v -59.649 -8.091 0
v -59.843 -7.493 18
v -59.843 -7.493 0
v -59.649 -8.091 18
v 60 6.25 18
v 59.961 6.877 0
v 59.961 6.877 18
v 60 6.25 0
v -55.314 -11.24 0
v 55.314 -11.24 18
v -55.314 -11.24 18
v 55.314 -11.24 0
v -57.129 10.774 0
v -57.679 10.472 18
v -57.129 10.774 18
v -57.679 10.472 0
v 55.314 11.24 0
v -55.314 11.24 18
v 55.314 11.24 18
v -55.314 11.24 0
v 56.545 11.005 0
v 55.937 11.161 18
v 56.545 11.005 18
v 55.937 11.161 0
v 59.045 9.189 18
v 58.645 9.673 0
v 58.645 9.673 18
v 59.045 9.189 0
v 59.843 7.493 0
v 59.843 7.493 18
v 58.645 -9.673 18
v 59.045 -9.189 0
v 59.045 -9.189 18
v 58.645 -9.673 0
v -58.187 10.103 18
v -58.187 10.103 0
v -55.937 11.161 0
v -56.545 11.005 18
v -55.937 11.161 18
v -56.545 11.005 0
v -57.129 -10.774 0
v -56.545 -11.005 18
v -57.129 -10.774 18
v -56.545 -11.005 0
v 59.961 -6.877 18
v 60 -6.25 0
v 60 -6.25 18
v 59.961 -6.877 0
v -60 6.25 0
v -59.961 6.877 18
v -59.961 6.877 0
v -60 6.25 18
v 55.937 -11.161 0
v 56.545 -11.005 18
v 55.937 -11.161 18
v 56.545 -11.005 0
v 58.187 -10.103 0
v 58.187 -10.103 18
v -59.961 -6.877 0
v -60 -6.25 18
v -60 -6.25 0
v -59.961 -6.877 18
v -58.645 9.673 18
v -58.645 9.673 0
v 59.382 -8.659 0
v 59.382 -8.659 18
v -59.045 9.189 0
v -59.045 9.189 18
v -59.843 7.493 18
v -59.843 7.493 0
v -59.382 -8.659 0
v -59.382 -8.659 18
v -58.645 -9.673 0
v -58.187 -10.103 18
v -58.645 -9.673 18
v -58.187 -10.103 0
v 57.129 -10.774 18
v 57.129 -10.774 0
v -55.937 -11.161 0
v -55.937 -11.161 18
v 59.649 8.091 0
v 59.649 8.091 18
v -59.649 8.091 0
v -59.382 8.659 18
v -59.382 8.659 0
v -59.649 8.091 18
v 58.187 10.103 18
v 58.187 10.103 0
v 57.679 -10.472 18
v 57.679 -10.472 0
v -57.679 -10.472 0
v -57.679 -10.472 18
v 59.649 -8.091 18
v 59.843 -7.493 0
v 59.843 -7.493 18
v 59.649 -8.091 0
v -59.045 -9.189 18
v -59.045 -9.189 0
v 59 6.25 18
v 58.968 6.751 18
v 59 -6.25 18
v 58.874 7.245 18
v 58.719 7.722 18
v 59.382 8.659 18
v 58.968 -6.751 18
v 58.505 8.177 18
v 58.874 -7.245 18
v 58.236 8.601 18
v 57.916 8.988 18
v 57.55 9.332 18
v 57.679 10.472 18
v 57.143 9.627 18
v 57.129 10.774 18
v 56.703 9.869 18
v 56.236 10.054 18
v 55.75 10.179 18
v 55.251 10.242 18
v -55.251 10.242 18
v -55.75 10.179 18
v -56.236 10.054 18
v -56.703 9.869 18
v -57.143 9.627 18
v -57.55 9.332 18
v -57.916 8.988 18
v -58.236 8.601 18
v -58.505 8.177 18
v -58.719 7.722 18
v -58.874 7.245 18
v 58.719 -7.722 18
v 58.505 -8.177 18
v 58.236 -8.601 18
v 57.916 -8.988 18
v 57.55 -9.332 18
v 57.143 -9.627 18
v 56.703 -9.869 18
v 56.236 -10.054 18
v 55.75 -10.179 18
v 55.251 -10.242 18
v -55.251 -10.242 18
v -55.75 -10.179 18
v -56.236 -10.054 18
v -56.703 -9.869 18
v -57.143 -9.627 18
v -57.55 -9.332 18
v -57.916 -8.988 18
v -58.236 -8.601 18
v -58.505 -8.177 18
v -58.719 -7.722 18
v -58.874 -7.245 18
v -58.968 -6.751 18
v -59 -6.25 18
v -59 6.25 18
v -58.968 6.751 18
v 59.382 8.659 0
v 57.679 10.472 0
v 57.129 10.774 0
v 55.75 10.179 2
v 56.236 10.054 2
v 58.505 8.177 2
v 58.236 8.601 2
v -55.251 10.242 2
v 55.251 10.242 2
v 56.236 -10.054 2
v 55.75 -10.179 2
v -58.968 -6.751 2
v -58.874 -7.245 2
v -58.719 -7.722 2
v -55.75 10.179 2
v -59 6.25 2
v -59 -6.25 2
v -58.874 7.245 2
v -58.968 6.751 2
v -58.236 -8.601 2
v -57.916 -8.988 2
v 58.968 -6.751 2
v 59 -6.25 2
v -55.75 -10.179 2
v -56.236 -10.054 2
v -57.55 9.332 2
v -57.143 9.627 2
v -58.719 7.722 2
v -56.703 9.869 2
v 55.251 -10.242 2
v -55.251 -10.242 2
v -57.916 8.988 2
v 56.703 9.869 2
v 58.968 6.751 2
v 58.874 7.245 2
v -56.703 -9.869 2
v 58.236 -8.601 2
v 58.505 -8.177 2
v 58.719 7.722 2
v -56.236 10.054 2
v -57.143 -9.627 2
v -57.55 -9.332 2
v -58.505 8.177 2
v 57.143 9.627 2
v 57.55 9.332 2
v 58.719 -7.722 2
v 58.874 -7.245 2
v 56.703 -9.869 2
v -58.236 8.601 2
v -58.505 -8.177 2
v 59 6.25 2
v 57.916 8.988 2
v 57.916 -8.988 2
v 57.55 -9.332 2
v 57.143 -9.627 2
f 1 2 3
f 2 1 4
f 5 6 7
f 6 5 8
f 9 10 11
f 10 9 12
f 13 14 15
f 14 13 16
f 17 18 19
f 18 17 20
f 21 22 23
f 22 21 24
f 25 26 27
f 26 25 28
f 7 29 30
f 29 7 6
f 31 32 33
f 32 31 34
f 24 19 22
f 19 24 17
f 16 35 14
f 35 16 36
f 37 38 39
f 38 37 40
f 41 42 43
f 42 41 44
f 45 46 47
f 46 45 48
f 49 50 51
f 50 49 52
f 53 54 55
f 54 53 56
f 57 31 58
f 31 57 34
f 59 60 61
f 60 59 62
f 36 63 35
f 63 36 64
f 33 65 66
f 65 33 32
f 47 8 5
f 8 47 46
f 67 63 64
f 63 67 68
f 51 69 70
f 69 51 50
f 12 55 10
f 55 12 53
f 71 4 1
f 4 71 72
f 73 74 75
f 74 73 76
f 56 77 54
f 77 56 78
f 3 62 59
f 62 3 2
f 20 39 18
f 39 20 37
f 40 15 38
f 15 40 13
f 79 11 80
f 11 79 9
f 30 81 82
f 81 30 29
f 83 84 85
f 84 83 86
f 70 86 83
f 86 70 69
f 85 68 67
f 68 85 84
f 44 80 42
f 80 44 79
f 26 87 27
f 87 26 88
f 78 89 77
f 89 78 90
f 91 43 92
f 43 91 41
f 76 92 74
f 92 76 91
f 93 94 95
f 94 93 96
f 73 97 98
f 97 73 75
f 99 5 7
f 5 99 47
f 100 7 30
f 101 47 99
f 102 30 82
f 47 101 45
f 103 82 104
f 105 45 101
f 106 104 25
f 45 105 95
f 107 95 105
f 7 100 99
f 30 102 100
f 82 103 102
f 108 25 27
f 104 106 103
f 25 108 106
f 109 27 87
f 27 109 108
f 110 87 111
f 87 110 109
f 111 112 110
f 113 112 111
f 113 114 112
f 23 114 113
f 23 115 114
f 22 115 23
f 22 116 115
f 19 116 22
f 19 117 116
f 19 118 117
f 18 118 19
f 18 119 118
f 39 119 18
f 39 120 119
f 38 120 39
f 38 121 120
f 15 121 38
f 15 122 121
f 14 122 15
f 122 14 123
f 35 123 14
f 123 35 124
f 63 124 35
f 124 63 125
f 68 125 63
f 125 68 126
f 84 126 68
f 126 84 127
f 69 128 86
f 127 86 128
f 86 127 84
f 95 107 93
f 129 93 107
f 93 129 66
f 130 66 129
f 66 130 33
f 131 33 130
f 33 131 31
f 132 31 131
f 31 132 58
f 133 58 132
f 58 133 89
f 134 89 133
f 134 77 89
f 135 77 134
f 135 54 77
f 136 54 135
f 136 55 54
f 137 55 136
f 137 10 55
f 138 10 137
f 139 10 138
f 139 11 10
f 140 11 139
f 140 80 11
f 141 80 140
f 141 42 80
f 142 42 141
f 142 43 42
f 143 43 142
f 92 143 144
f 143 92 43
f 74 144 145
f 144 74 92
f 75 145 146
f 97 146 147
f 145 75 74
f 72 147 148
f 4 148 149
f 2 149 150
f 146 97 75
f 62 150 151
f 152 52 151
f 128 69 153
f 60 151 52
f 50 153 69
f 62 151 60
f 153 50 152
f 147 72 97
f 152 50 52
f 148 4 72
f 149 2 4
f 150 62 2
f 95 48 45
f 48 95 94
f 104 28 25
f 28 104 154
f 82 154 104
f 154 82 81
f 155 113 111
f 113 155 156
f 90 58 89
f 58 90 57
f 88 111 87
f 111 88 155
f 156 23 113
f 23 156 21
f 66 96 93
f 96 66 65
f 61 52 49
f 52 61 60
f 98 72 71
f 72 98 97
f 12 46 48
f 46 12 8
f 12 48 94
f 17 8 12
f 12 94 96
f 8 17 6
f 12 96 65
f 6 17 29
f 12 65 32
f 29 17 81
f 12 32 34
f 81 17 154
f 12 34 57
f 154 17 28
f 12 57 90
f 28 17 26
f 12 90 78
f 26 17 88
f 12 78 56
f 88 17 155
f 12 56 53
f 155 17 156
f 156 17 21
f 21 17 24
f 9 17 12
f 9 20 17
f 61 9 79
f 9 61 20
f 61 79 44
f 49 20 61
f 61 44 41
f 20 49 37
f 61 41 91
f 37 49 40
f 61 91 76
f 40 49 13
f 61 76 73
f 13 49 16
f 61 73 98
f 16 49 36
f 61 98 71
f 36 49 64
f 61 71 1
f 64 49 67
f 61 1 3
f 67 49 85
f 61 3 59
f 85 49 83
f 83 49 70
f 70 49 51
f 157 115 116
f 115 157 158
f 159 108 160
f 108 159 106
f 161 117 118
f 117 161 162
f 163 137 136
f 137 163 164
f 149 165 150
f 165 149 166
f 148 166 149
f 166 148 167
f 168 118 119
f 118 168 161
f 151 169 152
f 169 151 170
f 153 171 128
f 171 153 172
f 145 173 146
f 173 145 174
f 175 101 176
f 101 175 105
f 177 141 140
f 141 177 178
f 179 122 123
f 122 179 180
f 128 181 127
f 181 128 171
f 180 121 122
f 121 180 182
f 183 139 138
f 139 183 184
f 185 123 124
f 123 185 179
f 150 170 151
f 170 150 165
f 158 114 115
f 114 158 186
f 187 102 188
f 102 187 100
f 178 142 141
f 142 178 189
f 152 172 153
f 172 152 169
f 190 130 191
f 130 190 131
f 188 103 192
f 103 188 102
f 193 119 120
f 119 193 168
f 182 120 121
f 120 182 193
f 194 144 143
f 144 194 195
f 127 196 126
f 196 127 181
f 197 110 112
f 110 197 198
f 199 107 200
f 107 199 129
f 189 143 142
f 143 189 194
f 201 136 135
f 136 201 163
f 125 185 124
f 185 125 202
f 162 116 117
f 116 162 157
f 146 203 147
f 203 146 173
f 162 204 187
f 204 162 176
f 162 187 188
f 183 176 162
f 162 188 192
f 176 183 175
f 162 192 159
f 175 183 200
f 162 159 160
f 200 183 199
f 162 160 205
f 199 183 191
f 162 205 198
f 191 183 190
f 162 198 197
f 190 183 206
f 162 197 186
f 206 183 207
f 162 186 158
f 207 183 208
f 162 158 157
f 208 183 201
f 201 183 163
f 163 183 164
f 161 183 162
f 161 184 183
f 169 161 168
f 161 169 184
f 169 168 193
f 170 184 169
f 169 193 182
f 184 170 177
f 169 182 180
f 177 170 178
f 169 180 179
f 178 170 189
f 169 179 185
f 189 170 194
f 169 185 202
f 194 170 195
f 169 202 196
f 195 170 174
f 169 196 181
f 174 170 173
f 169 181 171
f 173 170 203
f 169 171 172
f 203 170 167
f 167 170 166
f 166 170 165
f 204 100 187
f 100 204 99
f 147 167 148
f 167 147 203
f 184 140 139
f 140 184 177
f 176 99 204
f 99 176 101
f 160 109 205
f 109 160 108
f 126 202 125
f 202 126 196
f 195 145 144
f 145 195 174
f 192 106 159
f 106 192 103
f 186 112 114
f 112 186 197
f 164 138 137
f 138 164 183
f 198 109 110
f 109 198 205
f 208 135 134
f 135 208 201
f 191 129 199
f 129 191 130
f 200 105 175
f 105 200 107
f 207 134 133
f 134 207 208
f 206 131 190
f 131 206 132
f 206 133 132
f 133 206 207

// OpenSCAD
$fn = 50;


difference() {
	union() {
		hull() {
			translate(v = [-55.0000000000, 6.2500000000, 0]) {
				cylinder(h = 18, r = 5);
			}
			translate(v = [55.0000000000, 6.2500000000, 0]) {
				cylinder(h = 18, r = 5);
			}
			translate(v = [-55.0000000000, -6.2500000000, 0]) {
				cylinder(h = 18, r = 5);
			}
			translate(v = [55.0000000000, -6.2500000000, 0]) {
				cylinder(h = 18, r = 5);
			}
		}
	}
	union() {
		translate(v = [0, 0, 2]) {
			hull() {
				translate(v = [-55.0000000000, 6.2500000000, 0]) {
					cylinder(h = 16, r = 4);
				}
				translate(v = [55.0000000000, 6.2500000000, 0]) {
					cylinder(h = 16, r = 4);
				}
				translate(v = [-55.0000000000, -6.2500000000, 0]) {
					cylinder(h = 16, r = 4);
				}
				translate(v = [55.0000000000, -6.2500000000, 0]) {
					cylinder(h = 16, r = 4);
				}
			}
		}
	}
}
